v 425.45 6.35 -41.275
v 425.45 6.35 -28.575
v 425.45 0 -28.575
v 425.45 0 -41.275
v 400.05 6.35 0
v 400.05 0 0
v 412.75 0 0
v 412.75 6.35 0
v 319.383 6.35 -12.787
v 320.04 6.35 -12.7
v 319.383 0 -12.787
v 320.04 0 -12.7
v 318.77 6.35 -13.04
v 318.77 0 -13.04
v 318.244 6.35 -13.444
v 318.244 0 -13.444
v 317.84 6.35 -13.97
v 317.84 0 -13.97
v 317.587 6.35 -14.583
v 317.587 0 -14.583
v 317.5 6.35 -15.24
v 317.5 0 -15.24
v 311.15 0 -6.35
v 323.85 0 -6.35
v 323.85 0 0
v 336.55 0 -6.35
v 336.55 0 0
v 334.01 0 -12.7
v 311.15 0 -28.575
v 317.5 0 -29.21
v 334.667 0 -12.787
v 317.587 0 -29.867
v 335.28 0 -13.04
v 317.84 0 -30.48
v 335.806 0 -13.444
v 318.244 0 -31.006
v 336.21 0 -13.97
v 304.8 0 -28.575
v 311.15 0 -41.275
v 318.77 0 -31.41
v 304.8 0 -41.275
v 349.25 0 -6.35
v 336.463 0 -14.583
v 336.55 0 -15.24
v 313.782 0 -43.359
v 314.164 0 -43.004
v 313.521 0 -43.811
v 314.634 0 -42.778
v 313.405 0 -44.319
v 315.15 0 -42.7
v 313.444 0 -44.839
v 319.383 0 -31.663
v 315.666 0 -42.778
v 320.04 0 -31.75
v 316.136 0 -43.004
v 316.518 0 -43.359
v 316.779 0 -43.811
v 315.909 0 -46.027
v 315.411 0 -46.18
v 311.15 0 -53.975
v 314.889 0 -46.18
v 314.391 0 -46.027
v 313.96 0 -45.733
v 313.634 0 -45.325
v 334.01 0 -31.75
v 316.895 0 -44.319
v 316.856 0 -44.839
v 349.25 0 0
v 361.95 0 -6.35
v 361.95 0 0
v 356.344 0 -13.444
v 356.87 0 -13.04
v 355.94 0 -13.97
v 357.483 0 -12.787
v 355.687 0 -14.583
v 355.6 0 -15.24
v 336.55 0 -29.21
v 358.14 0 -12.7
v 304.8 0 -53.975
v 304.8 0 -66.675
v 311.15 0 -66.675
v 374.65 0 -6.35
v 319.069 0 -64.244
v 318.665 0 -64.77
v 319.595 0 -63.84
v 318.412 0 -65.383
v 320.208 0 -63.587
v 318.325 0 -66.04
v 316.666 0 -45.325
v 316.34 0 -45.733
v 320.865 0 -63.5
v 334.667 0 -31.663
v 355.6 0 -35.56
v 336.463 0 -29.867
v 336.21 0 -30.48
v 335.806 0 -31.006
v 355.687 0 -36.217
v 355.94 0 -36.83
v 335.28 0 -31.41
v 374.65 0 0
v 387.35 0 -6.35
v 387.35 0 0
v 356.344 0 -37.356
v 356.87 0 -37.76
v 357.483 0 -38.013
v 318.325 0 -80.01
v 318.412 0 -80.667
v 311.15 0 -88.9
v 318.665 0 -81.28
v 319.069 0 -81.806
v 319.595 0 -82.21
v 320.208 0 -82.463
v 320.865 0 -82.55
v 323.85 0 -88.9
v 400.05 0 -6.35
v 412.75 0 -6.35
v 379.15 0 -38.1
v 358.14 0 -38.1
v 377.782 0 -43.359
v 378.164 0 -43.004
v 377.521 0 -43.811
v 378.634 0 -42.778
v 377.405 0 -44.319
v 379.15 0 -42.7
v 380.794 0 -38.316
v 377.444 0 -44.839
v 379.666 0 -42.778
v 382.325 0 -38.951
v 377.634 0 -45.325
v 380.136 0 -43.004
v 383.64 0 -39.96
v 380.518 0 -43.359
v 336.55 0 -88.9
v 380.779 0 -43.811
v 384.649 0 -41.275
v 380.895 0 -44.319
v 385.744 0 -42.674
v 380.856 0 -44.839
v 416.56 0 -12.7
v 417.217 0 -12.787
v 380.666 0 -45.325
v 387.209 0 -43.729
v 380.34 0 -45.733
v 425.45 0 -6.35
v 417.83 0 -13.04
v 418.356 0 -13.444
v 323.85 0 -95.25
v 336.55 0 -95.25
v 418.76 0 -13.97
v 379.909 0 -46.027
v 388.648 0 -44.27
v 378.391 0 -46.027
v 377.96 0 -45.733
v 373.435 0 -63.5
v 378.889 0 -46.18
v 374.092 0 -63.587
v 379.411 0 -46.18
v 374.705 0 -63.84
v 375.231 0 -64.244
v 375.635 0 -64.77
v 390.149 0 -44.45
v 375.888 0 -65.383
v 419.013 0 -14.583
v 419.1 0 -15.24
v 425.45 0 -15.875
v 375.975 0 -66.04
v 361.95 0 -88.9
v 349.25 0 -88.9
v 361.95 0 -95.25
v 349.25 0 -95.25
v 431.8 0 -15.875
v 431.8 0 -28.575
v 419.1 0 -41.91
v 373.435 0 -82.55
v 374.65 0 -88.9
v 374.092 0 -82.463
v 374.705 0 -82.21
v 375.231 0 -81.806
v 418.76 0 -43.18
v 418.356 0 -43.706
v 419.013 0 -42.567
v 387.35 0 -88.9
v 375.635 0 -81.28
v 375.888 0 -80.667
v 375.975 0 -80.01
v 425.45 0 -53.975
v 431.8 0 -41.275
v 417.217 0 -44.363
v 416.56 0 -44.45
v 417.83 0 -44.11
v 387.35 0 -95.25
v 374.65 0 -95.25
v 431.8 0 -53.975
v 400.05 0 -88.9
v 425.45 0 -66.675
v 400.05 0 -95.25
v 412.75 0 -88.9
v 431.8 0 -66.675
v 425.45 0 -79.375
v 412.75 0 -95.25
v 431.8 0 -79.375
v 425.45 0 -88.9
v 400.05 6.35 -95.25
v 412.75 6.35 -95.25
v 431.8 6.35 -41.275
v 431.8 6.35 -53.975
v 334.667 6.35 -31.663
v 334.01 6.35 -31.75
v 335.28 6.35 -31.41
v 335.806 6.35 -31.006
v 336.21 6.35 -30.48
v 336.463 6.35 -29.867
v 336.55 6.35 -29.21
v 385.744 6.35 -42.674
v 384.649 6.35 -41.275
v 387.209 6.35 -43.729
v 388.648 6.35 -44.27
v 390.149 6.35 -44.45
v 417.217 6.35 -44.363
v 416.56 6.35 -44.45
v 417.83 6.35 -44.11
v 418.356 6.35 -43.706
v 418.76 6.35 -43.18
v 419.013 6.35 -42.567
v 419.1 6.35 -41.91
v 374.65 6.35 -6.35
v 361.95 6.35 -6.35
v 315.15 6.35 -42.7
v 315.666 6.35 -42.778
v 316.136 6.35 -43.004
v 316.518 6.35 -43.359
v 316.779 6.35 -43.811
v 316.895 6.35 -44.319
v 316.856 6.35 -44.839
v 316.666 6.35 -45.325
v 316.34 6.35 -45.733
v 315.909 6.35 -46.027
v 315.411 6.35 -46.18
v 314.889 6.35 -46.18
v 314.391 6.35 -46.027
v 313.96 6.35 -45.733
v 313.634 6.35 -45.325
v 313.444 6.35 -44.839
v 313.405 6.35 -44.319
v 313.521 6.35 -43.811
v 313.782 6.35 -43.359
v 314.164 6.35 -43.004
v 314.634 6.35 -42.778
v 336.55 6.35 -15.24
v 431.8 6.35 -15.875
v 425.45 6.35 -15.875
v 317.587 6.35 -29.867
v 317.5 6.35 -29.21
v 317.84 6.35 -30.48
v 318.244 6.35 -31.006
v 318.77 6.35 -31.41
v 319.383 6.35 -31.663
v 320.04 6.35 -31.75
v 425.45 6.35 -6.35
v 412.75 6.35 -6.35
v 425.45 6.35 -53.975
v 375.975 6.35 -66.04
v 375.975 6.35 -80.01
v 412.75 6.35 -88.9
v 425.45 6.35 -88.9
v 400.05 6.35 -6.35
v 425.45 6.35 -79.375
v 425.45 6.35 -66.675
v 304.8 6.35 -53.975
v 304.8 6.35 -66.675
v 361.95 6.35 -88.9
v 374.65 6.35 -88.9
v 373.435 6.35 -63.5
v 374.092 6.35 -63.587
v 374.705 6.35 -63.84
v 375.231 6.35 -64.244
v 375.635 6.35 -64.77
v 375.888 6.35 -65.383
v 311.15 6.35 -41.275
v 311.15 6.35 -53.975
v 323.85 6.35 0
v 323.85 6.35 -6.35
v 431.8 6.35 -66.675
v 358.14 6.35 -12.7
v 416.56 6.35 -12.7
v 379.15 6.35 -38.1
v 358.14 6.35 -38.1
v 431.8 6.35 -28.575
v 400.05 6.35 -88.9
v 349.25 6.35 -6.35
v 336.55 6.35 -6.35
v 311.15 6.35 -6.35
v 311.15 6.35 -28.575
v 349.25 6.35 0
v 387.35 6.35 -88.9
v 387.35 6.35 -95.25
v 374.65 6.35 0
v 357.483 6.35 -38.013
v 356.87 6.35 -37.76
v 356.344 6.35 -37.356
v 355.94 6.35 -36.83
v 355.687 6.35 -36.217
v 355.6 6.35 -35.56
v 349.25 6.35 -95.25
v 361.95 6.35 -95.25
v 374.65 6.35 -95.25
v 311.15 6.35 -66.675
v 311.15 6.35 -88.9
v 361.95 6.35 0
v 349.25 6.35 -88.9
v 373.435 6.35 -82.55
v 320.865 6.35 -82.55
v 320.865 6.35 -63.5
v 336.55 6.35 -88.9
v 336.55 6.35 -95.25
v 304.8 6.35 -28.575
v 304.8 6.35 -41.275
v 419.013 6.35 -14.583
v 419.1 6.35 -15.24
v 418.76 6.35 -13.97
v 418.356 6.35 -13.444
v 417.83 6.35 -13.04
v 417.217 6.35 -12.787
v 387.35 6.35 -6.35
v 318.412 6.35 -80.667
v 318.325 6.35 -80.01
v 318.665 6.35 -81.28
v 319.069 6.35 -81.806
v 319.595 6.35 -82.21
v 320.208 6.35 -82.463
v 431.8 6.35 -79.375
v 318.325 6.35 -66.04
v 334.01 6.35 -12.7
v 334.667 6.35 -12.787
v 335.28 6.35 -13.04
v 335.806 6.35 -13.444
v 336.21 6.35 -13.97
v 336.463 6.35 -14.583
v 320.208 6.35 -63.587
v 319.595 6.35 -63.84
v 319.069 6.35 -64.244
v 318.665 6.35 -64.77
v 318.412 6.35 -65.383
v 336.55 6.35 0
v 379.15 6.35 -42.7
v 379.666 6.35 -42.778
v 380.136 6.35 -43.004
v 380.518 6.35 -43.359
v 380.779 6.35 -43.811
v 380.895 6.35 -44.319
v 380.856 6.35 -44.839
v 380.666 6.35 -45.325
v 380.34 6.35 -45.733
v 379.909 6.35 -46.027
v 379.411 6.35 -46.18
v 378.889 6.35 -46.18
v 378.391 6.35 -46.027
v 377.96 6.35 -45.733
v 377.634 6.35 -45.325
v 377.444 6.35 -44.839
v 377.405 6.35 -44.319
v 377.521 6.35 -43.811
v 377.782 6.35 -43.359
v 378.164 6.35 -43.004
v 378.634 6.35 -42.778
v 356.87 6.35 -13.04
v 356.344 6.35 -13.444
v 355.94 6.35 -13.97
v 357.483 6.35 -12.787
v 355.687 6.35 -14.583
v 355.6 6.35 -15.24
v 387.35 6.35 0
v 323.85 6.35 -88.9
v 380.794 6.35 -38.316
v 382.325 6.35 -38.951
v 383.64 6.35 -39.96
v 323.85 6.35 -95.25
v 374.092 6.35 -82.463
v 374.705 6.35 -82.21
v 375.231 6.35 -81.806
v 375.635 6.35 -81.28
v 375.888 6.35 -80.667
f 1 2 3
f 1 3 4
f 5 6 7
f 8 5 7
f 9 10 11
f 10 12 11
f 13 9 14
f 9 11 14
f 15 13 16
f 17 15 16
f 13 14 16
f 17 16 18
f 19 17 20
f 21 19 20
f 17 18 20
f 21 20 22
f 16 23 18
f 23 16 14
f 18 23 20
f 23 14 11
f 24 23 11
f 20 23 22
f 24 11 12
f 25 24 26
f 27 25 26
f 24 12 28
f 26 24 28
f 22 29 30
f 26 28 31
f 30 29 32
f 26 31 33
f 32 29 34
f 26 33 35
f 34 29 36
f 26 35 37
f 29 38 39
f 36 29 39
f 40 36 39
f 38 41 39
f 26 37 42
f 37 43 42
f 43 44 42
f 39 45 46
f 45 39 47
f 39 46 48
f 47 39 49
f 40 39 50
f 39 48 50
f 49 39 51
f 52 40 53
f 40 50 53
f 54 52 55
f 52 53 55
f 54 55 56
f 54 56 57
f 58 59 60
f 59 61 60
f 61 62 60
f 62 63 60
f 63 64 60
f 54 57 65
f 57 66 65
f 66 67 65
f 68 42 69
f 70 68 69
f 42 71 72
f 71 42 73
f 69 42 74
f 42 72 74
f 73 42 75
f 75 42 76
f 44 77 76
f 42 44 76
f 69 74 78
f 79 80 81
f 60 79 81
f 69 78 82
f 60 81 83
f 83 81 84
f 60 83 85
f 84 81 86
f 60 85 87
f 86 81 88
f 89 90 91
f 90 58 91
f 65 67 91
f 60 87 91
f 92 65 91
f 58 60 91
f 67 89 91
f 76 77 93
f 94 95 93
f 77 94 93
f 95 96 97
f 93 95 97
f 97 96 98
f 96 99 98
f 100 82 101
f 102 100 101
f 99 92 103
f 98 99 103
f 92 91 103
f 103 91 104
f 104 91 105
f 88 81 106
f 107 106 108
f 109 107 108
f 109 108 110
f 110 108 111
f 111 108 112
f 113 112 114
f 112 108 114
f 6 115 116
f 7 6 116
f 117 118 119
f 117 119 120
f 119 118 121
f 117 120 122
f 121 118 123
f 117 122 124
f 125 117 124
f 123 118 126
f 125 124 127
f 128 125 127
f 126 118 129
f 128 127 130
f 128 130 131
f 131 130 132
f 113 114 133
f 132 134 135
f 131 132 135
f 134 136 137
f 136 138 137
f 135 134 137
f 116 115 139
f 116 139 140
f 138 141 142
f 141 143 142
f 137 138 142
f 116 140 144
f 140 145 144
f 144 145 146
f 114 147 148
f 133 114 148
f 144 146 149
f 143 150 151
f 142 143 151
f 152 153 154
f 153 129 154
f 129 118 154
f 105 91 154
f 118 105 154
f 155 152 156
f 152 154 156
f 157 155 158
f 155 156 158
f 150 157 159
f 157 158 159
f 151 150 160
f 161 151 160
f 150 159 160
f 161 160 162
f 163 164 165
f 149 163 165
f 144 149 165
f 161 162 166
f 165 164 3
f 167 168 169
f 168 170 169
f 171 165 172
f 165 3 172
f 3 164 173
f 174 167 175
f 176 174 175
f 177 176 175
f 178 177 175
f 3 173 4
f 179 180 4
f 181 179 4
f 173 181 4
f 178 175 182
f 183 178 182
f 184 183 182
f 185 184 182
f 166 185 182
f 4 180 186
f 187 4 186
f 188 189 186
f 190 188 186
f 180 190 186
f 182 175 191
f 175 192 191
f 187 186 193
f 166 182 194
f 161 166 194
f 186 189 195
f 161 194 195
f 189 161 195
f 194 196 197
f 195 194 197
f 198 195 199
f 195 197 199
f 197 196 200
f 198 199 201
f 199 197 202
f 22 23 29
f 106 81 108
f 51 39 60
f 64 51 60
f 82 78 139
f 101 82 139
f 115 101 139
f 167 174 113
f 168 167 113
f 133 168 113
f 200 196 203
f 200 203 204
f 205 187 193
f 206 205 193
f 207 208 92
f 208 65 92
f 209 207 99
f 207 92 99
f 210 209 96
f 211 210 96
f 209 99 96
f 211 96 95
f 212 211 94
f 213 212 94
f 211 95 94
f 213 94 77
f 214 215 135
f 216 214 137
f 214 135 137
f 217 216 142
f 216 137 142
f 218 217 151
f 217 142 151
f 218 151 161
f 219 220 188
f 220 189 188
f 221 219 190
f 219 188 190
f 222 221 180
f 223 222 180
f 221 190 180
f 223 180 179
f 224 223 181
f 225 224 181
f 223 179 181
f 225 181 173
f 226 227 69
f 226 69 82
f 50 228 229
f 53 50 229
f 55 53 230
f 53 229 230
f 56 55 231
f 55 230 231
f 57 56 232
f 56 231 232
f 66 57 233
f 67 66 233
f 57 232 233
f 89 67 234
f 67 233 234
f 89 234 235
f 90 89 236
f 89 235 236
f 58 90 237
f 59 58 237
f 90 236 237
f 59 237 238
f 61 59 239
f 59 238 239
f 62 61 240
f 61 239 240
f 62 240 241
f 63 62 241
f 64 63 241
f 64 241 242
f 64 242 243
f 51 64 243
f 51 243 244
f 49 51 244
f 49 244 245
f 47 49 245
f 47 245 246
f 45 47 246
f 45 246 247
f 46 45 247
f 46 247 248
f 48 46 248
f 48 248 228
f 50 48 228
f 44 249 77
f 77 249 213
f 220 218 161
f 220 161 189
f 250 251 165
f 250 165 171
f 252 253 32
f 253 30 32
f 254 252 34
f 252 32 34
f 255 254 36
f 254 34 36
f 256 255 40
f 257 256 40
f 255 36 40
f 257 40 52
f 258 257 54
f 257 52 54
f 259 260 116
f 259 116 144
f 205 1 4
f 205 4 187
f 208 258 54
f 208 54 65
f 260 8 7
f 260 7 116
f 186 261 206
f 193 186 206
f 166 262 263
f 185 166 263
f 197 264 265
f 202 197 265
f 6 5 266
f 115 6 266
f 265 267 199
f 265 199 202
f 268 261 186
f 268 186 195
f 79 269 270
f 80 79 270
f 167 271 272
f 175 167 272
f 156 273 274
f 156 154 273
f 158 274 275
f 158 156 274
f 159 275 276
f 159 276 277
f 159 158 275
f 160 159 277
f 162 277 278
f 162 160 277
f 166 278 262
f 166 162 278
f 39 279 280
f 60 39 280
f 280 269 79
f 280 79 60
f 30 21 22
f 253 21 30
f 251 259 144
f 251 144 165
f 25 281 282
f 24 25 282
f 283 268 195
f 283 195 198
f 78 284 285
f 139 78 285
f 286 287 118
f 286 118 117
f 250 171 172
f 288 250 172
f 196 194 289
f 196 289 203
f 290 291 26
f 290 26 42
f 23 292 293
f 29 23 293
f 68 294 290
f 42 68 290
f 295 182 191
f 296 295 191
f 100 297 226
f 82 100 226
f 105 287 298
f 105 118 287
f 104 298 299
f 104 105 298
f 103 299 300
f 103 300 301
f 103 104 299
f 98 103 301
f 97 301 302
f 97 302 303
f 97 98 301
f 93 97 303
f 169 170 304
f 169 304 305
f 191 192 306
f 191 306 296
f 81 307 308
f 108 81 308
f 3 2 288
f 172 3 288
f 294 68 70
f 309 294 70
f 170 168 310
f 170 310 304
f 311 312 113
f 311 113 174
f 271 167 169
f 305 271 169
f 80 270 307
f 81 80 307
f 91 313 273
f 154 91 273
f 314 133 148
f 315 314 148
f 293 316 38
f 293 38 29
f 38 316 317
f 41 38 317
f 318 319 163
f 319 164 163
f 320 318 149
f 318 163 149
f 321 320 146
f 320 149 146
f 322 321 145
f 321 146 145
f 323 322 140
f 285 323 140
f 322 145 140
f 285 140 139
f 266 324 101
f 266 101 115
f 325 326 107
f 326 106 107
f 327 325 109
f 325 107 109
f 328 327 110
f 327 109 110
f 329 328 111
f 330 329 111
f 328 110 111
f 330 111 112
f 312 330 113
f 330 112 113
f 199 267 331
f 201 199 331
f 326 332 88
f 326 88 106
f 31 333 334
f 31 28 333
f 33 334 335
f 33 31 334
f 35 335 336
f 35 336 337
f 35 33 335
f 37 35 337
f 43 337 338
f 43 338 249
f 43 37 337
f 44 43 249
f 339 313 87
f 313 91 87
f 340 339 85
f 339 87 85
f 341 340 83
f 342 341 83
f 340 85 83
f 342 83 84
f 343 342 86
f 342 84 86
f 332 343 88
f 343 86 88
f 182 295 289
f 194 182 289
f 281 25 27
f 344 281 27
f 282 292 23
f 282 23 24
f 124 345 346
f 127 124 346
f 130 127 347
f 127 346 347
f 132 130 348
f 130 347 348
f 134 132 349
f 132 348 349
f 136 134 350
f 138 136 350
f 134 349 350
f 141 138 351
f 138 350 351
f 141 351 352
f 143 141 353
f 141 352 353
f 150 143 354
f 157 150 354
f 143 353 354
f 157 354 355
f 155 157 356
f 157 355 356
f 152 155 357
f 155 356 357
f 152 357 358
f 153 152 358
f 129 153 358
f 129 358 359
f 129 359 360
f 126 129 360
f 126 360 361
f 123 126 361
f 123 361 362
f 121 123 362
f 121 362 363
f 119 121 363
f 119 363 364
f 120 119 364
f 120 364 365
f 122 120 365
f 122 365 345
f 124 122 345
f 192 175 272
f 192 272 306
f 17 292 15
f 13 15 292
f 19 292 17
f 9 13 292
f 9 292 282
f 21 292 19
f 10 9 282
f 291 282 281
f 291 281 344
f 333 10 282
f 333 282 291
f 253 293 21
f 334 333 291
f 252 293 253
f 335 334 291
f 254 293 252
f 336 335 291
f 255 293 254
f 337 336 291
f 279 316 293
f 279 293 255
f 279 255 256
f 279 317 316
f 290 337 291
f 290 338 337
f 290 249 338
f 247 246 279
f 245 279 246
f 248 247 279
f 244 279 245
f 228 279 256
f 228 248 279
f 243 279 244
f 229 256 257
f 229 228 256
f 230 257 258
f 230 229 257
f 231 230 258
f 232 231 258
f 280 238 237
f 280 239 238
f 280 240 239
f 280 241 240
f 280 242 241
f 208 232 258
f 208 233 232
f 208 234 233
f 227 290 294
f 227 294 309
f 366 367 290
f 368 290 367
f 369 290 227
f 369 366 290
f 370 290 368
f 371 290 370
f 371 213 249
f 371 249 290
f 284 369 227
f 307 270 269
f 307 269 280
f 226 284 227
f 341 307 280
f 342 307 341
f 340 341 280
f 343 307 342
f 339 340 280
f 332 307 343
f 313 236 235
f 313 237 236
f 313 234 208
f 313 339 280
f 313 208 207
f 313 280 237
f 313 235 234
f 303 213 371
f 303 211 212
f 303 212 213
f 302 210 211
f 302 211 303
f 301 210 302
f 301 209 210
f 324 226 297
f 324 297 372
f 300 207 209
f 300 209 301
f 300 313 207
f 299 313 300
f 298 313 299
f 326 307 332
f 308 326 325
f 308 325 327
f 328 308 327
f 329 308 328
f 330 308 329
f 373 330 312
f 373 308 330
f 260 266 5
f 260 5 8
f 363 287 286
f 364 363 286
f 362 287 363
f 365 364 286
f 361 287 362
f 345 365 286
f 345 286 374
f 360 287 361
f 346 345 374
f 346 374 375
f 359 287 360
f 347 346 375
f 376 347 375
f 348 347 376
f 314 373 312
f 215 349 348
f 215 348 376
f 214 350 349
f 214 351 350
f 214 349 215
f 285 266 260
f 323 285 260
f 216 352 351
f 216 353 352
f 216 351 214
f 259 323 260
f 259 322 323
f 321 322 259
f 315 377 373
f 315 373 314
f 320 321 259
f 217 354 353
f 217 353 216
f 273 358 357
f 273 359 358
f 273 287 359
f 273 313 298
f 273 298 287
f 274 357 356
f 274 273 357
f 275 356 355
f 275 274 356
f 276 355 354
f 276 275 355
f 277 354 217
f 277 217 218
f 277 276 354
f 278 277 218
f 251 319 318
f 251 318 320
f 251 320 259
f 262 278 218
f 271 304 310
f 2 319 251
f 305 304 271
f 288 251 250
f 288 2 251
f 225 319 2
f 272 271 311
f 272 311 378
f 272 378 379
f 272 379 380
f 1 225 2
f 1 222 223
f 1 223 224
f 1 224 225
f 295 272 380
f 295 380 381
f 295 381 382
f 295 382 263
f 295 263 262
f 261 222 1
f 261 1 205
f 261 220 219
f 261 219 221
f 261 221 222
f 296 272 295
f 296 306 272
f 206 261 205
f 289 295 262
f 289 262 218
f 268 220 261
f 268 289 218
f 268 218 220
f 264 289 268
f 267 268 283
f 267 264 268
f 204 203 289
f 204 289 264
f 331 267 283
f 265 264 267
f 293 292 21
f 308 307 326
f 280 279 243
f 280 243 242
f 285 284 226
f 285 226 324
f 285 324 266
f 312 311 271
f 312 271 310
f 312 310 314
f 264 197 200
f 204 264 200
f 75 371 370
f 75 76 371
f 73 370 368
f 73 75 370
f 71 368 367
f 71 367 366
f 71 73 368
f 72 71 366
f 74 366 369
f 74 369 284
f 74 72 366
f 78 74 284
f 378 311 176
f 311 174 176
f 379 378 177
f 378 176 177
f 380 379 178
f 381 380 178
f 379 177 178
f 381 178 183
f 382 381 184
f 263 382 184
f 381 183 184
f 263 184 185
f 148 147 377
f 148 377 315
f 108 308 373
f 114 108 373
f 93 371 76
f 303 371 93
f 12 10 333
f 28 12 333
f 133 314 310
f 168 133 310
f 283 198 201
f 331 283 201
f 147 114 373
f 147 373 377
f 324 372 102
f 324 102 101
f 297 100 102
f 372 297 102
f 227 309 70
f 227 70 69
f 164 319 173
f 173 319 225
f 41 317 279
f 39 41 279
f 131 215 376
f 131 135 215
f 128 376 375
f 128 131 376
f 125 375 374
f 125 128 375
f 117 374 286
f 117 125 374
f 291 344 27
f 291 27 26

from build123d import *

# Parameters (mm, degrees)
SKETCH1_W           = 431.8
SKETCH1_H           = 95.25
BOSS_EXTRUDE1_DEPTH = 6.35
SKETCH2_W           = 12.7
SKETCH2_H           = 6.35
CUT_EXTRUDE1_DEPTH  = 443.226327801
LPATTERN1_COUNT     = 17
LPATTERN1_PITCH     = 25.4
SKETCH3_W           = 6.35
SKETCH3_H           = 6.35
CUT_EXTRUDE2_DEPTH  = 443.226327801
SKETCH5_W           = 6.35
SKETCH5_H           = 12.7
CUT_EXTRUDE4_DEPTH  = 443.226327801
LPATTERN2_COUNT     = 2
LPATTERN2_PITCH     = 25.4
LPATTERN2_COL_COUNT = 2
LPATTERN2_COL_PITCH = 25.4
SKETCH6_W           = 114.3
SKETCH6_H           = 46.0375
CUT_EXTRUDE5_DEPTH  = 443.226327801
SKETCH7_R           = 1.75
CUT_EXTRUDE6_DEPTH  = 443.226327801
SKETCH8_W           = 6.35
SKETCH8_H           = 9.525
SKETCH8_H_2         = 12.7
CUT_EXTRUDE7_DEPTH  = 443.226327801
LPATTERN3_COUNT     = 2
LPATTERN3_PITCH     = 425.45
SKETCH9_W           = 304.8
SKETCH9_H           = 95.25
CUT_EXTRUDE8_DEPTH  = 443.226327801
SKETCH10_W          = 6.35
SKETCH10_H          = 15.875
CUT_EXTRUDE9_DEPTH  = 443.226327801
SKETCH11_W          = 57.65
SKETCH11_H          = 19.05
CUT_EXTRUDE10_DEPTH = 443.226327801
SKETCH12_W          = 63.5
SKETCH12_H          = 25.4
CUT_EXTRUDE11_DEPTH = 443.226327801
SKETCH13_W          = 19.05
SKETCH13_H          = 19.05
CUT_EXTRUDE12_DEPTH = 443.226327801
SKETCH14_W          = 33.6
SKETCH14_H          = 6.35
CUT_EXTRUDE13_DEPTH = 443.226327801
FILLET1_R           = 6.35
FILLET2_R           = 6.35
FILLET3_R           = 2.54


with BuildPart() as part:
    # Sketch1 → Boss-Extrude1 (new body)
    with BuildSketch(Plane(origin=(0, 0, 0), x_dir=(1, 0, 0), z_dir=(0, 1, 0))):
        with Locations((215.9, 47.625)):
            Rectangle(SKETCH1_W, SKETCH1_H)
    extrude(amount=BOSS_EXTRUDE1_DEPTH)

    # Sketch2 → Cut-Extrude1 (cut, through all)
    with BuildSketch(Plane(origin=(0, 6.35, 0), x_dir=(1, 0, 0), z_dir=(0, 1, 0))):
        with Locations((12.7, 92.075)):
            Rectangle(SKETCH2_W, SKETCH2_H)
        with Locations((12.7, 3.175)):
            Rectangle(SKETCH2_W, SKETCH2_H)
    cut_extrude1 = extrude(amount=-CUT_EXTRUDE1_DEPTH, mode=Mode.SUBTRACT)

    # LPattern1: Cut-Extrude1 ×17
    with Locations(*[(i * LPATTERN1_PITCH, 0, 0) for i in range(1, LPATTERN1_COUNT)]):
        add(cut_extrude1, mode=Mode.SUBTRACT)

    # Sketch3 → Cut-Extrude2 (cut, through all)
    with BuildSketch(Plane(origin=(0, 6.35, 0), x_dir=(1, 0, 0), z_dir=(0, 1, 0))):
        with Locations((3.175, 92.075)):
            Rectangle(SKETCH3_W, SKETCH3_H)
        with Locations((3.175, 3.175)):
            Rectangle(SKETCH3_W, SKETCH3_H)
        with Locations((428.625, 92.075)):
            Rectangle(SKETCH3_W, SKETCH3_H)
        with Locations((428.625, 3.175)):
            Rectangle(SKETCH3_W, SKETCH3_H)
    extrude(amount=-CUT_EXTRUDE2_DEPTH, mode=Mode.SUBTRACT)

    # Sketch5 → Cut-Extrude4 (cut, through all)
    with BuildSketch(Plane(origin=(0, 6.35, 0), x_dir=(1, 0, 0), z_dir=(0, 1, 0))):
        with Locations((187.325, 47.625)):
            Rectangle(SKETCH5_W, SKETCH5_H)
        with Locations((307.975, 47.625)):
            Rectangle(SKETCH5_W, SKETCH5_H)
    cut_extrude4 = extrude(amount=-CUT_EXTRUDE4_DEPTH, mode=Mode.SUBTRACT)

    # LPattern2: Cut-Extrude4 ×2
    with Locations(*[(0, 0, -i * LPATTERN2_PITCH) for i in range(1, LPATTERN2_COUNT)]):
        add(cut_extrude4, mode=Mode.SUBTRACT)

    # LPattern2 col: Cut-Extrude4 ×2
    with Locations(*[(0, 0, i * LPATTERN2_COL_PITCH) for i in range(1, LPATTERN2_COL_COUNT)]):
        add(cut_extrude4, mode=Mode.SUBTRACT)

    # Sketch6 → Cut-Extrude5 (cut, through all)
    with BuildSketch(Plane(origin=(0, 6.35, 0), x_dir=(1, 0, 0), z_dir=(0, 1, 0))):
        with Locations((247.65, 47.625)):
            Rectangle(SKETCH6_W, SKETCH6_H)
    extrude(amount=-CUT_EXTRUDE5_DEPTH, mode=Mode.SUBTRACT)

    # Sketch7 → Cut-Extrude6 (cut, through all)
    with BuildSketch(Plane(origin=(0, 6.35, 0), x_dir=(1, 0, 0), z_dir=(0, 1, 0))):
        with Locations(Location((52.65, 44.45, 0), (0, 0, 270))):
            Circle(SKETCH7_R)
        with Locations(Location((116.65, 44.45, 0), (0, 0, 270))):
            Circle(SKETCH7_R)
        with Locations(Location((315.15, 44.45, 0), (0, 0, 270))):
            Circle(SKETCH7_R)
        with Locations(Location((379.15, 44.45, 0), (0, 0, 270))):
            Circle(SKETCH7_R)
    extrude(amount=-CUT_EXTRUDE6_DEPTH, mode=Mode.SUBTRACT)

    # Sketch8 → Cut-Extrude7 (cut, through all)
    with BuildSketch(Plane(origin=(0, 6.35, 0), x_dir=(1, 0, 0), z_dir=(0, 1, 0))):
        with Locations((3.175, 84.1375)):
            Rectangle(SKETCH8_W, SKETCH8_H)
        with Locations((3.175, 11.1125)):
            Rectangle(SKETCH8_W, SKETCH8_H)
        with Locations((3.175, 34.925)):
            Rectangle(SKETCH8_W, SKETCH8_H_2)
        with Locations((3.175, 60.325)):
            Rectangle(SKETCH8_W, SKETCH8_H_2)
    cut_extrude7 = extrude(amount=-CUT_EXTRUDE7_DEPTH, mode=Mode.SUBTRACT)

    # LPattern3: Cut-Extrude7 ×2
    with Locations(*[(i * LPATTERN3_PITCH, 0, 0) for i in range(1, LPATTERN3_COUNT)]):
        add(cut_extrude7, mode=Mode.SUBTRACT)

    # Sketch9 → Cut-Extrude8 (cut, through all)
    with BuildSketch(Plane(origin=(0, 6.35, 0), x_dir=(1, 0, 0), z_dir=(0, 1, 0))):
        with Locations((152.4, 47.625)):
            Rectangle(SKETCH9_W, SKETCH9_H)
    extrude(amount=-CUT_EXTRUDE8_DEPTH, mode=Mode.SUBTRACT)

    # Sketch10 → Cut-Extrude9 (cut, through all)
    with BuildSketch(Plane(origin=(0, 6.35, 0), x_dir=(1, 0, 0), z_dir=(0, 1, 0))):
        with Locations((307.975, 87.3125)):
            Rectangle(SKETCH10_W, SKETCH10_H)
        with Locations((307.975, 7.9375)):
            Rectangle(SKETCH10_W, SKETCH10_H)
    extrude(amount=-CUT_EXTRUDE9_DEPTH, mode=Mode.SUBTRACT)

    # Sketch11 → Cut-Extrude10 (cut, through all)
    with BuildSketch(Plane(origin=(0, 6.35, 0), x_dir=(1, 0, 0), z_dir=(0, 1, 0))):
        with Locations((347.15, 73.025)):
            Rectangle(SKETCH11_W, SKETCH11_H)
    extrude(amount=-CUT_EXTRUDE10_DEPTH, mode=Mode.SUBTRACT)

    # Sketch12 → Cut-Extrude11 (cut, through all)
    with BuildSketch(Plane(origin=(0, 6.35, 0), x_dir=(1, 0, 0), z_dir=(0, 1, 0))):
        with Locations((387.35, 25.4)):
            Rectangle(SKETCH12_W, SKETCH12_H)
    extrude(amount=-CUT_EXTRUDE11_DEPTH, mode=Mode.SUBTRACT)

    # Sketch13 → Cut-Extrude12 (cut, through all)
    with BuildSketch(Plane(origin=(0, 6.35, 0), x_dir=(1, 0, 0), z_dir=(0, 1, 0))):
        with Locations((327.025, 22.225)):
            Rectangle(SKETCH13_W, SKETCH13_H)
    extrude(amount=-CUT_EXTRUDE12_DEPTH, mode=Mode.SUBTRACT)

    # Sketch14 → Cut-Extrude13 (cut, through all)
    with BuildSketch(Plane(origin=(0, 6.35, 0), x_dir=(1, 0, 0), z_dir=(0, 1, 0))):
        with Locations((402.3, 41.275)):
            Rectangle(SKETCH14_W, SKETCH14_H)
    extrude(amount=-CUT_EXTRUDE13_DEPTH, mode=Mode.SUBTRACT)

    # Fillet1
    fillet1_edges = [part.edges().sort_by_distance(p)[0] for p in [
        (385.5, 3.175, -38.1),
    ]]
    fillet(fillet1_edges, radius=FILLET1_R - 0.0001)  # a hair under: the kernel refuses the full size

    # Fillet2
    fillet2_edges = [part.edges().sort_by_distance(p)[0] for p in [
        (385.5, 3.175, -44.45),
    ]]
    fillet(fillet2_edges, radius=FILLET2_R)

    # Fillet3
    fillet3_edges = [part.edges().sort_by_distance(p)[0] for p in [
        (318.325, 3.175, -63.5),
        (318.325, 3.175, -82.55),
        (375.975, 3.175, -82.55),
        (375.975, 3.175, -63.5),
        (419.1, 3.175, -12.7),
        (355.6, 3.175, -12.7),
        (355.6, 3.175, -38.1),
        (317.5, 3.175, -12.7),
        (317.5, 3.175, -31.75),
        (336.55, 3.175, -31.75),
        (336.55, 3.175, -12.7),
        (419.1, 3.175, -44.45),
    ]]
    fillet(fillet3_edges, radius=FILLET3_R)


solid = part.part
